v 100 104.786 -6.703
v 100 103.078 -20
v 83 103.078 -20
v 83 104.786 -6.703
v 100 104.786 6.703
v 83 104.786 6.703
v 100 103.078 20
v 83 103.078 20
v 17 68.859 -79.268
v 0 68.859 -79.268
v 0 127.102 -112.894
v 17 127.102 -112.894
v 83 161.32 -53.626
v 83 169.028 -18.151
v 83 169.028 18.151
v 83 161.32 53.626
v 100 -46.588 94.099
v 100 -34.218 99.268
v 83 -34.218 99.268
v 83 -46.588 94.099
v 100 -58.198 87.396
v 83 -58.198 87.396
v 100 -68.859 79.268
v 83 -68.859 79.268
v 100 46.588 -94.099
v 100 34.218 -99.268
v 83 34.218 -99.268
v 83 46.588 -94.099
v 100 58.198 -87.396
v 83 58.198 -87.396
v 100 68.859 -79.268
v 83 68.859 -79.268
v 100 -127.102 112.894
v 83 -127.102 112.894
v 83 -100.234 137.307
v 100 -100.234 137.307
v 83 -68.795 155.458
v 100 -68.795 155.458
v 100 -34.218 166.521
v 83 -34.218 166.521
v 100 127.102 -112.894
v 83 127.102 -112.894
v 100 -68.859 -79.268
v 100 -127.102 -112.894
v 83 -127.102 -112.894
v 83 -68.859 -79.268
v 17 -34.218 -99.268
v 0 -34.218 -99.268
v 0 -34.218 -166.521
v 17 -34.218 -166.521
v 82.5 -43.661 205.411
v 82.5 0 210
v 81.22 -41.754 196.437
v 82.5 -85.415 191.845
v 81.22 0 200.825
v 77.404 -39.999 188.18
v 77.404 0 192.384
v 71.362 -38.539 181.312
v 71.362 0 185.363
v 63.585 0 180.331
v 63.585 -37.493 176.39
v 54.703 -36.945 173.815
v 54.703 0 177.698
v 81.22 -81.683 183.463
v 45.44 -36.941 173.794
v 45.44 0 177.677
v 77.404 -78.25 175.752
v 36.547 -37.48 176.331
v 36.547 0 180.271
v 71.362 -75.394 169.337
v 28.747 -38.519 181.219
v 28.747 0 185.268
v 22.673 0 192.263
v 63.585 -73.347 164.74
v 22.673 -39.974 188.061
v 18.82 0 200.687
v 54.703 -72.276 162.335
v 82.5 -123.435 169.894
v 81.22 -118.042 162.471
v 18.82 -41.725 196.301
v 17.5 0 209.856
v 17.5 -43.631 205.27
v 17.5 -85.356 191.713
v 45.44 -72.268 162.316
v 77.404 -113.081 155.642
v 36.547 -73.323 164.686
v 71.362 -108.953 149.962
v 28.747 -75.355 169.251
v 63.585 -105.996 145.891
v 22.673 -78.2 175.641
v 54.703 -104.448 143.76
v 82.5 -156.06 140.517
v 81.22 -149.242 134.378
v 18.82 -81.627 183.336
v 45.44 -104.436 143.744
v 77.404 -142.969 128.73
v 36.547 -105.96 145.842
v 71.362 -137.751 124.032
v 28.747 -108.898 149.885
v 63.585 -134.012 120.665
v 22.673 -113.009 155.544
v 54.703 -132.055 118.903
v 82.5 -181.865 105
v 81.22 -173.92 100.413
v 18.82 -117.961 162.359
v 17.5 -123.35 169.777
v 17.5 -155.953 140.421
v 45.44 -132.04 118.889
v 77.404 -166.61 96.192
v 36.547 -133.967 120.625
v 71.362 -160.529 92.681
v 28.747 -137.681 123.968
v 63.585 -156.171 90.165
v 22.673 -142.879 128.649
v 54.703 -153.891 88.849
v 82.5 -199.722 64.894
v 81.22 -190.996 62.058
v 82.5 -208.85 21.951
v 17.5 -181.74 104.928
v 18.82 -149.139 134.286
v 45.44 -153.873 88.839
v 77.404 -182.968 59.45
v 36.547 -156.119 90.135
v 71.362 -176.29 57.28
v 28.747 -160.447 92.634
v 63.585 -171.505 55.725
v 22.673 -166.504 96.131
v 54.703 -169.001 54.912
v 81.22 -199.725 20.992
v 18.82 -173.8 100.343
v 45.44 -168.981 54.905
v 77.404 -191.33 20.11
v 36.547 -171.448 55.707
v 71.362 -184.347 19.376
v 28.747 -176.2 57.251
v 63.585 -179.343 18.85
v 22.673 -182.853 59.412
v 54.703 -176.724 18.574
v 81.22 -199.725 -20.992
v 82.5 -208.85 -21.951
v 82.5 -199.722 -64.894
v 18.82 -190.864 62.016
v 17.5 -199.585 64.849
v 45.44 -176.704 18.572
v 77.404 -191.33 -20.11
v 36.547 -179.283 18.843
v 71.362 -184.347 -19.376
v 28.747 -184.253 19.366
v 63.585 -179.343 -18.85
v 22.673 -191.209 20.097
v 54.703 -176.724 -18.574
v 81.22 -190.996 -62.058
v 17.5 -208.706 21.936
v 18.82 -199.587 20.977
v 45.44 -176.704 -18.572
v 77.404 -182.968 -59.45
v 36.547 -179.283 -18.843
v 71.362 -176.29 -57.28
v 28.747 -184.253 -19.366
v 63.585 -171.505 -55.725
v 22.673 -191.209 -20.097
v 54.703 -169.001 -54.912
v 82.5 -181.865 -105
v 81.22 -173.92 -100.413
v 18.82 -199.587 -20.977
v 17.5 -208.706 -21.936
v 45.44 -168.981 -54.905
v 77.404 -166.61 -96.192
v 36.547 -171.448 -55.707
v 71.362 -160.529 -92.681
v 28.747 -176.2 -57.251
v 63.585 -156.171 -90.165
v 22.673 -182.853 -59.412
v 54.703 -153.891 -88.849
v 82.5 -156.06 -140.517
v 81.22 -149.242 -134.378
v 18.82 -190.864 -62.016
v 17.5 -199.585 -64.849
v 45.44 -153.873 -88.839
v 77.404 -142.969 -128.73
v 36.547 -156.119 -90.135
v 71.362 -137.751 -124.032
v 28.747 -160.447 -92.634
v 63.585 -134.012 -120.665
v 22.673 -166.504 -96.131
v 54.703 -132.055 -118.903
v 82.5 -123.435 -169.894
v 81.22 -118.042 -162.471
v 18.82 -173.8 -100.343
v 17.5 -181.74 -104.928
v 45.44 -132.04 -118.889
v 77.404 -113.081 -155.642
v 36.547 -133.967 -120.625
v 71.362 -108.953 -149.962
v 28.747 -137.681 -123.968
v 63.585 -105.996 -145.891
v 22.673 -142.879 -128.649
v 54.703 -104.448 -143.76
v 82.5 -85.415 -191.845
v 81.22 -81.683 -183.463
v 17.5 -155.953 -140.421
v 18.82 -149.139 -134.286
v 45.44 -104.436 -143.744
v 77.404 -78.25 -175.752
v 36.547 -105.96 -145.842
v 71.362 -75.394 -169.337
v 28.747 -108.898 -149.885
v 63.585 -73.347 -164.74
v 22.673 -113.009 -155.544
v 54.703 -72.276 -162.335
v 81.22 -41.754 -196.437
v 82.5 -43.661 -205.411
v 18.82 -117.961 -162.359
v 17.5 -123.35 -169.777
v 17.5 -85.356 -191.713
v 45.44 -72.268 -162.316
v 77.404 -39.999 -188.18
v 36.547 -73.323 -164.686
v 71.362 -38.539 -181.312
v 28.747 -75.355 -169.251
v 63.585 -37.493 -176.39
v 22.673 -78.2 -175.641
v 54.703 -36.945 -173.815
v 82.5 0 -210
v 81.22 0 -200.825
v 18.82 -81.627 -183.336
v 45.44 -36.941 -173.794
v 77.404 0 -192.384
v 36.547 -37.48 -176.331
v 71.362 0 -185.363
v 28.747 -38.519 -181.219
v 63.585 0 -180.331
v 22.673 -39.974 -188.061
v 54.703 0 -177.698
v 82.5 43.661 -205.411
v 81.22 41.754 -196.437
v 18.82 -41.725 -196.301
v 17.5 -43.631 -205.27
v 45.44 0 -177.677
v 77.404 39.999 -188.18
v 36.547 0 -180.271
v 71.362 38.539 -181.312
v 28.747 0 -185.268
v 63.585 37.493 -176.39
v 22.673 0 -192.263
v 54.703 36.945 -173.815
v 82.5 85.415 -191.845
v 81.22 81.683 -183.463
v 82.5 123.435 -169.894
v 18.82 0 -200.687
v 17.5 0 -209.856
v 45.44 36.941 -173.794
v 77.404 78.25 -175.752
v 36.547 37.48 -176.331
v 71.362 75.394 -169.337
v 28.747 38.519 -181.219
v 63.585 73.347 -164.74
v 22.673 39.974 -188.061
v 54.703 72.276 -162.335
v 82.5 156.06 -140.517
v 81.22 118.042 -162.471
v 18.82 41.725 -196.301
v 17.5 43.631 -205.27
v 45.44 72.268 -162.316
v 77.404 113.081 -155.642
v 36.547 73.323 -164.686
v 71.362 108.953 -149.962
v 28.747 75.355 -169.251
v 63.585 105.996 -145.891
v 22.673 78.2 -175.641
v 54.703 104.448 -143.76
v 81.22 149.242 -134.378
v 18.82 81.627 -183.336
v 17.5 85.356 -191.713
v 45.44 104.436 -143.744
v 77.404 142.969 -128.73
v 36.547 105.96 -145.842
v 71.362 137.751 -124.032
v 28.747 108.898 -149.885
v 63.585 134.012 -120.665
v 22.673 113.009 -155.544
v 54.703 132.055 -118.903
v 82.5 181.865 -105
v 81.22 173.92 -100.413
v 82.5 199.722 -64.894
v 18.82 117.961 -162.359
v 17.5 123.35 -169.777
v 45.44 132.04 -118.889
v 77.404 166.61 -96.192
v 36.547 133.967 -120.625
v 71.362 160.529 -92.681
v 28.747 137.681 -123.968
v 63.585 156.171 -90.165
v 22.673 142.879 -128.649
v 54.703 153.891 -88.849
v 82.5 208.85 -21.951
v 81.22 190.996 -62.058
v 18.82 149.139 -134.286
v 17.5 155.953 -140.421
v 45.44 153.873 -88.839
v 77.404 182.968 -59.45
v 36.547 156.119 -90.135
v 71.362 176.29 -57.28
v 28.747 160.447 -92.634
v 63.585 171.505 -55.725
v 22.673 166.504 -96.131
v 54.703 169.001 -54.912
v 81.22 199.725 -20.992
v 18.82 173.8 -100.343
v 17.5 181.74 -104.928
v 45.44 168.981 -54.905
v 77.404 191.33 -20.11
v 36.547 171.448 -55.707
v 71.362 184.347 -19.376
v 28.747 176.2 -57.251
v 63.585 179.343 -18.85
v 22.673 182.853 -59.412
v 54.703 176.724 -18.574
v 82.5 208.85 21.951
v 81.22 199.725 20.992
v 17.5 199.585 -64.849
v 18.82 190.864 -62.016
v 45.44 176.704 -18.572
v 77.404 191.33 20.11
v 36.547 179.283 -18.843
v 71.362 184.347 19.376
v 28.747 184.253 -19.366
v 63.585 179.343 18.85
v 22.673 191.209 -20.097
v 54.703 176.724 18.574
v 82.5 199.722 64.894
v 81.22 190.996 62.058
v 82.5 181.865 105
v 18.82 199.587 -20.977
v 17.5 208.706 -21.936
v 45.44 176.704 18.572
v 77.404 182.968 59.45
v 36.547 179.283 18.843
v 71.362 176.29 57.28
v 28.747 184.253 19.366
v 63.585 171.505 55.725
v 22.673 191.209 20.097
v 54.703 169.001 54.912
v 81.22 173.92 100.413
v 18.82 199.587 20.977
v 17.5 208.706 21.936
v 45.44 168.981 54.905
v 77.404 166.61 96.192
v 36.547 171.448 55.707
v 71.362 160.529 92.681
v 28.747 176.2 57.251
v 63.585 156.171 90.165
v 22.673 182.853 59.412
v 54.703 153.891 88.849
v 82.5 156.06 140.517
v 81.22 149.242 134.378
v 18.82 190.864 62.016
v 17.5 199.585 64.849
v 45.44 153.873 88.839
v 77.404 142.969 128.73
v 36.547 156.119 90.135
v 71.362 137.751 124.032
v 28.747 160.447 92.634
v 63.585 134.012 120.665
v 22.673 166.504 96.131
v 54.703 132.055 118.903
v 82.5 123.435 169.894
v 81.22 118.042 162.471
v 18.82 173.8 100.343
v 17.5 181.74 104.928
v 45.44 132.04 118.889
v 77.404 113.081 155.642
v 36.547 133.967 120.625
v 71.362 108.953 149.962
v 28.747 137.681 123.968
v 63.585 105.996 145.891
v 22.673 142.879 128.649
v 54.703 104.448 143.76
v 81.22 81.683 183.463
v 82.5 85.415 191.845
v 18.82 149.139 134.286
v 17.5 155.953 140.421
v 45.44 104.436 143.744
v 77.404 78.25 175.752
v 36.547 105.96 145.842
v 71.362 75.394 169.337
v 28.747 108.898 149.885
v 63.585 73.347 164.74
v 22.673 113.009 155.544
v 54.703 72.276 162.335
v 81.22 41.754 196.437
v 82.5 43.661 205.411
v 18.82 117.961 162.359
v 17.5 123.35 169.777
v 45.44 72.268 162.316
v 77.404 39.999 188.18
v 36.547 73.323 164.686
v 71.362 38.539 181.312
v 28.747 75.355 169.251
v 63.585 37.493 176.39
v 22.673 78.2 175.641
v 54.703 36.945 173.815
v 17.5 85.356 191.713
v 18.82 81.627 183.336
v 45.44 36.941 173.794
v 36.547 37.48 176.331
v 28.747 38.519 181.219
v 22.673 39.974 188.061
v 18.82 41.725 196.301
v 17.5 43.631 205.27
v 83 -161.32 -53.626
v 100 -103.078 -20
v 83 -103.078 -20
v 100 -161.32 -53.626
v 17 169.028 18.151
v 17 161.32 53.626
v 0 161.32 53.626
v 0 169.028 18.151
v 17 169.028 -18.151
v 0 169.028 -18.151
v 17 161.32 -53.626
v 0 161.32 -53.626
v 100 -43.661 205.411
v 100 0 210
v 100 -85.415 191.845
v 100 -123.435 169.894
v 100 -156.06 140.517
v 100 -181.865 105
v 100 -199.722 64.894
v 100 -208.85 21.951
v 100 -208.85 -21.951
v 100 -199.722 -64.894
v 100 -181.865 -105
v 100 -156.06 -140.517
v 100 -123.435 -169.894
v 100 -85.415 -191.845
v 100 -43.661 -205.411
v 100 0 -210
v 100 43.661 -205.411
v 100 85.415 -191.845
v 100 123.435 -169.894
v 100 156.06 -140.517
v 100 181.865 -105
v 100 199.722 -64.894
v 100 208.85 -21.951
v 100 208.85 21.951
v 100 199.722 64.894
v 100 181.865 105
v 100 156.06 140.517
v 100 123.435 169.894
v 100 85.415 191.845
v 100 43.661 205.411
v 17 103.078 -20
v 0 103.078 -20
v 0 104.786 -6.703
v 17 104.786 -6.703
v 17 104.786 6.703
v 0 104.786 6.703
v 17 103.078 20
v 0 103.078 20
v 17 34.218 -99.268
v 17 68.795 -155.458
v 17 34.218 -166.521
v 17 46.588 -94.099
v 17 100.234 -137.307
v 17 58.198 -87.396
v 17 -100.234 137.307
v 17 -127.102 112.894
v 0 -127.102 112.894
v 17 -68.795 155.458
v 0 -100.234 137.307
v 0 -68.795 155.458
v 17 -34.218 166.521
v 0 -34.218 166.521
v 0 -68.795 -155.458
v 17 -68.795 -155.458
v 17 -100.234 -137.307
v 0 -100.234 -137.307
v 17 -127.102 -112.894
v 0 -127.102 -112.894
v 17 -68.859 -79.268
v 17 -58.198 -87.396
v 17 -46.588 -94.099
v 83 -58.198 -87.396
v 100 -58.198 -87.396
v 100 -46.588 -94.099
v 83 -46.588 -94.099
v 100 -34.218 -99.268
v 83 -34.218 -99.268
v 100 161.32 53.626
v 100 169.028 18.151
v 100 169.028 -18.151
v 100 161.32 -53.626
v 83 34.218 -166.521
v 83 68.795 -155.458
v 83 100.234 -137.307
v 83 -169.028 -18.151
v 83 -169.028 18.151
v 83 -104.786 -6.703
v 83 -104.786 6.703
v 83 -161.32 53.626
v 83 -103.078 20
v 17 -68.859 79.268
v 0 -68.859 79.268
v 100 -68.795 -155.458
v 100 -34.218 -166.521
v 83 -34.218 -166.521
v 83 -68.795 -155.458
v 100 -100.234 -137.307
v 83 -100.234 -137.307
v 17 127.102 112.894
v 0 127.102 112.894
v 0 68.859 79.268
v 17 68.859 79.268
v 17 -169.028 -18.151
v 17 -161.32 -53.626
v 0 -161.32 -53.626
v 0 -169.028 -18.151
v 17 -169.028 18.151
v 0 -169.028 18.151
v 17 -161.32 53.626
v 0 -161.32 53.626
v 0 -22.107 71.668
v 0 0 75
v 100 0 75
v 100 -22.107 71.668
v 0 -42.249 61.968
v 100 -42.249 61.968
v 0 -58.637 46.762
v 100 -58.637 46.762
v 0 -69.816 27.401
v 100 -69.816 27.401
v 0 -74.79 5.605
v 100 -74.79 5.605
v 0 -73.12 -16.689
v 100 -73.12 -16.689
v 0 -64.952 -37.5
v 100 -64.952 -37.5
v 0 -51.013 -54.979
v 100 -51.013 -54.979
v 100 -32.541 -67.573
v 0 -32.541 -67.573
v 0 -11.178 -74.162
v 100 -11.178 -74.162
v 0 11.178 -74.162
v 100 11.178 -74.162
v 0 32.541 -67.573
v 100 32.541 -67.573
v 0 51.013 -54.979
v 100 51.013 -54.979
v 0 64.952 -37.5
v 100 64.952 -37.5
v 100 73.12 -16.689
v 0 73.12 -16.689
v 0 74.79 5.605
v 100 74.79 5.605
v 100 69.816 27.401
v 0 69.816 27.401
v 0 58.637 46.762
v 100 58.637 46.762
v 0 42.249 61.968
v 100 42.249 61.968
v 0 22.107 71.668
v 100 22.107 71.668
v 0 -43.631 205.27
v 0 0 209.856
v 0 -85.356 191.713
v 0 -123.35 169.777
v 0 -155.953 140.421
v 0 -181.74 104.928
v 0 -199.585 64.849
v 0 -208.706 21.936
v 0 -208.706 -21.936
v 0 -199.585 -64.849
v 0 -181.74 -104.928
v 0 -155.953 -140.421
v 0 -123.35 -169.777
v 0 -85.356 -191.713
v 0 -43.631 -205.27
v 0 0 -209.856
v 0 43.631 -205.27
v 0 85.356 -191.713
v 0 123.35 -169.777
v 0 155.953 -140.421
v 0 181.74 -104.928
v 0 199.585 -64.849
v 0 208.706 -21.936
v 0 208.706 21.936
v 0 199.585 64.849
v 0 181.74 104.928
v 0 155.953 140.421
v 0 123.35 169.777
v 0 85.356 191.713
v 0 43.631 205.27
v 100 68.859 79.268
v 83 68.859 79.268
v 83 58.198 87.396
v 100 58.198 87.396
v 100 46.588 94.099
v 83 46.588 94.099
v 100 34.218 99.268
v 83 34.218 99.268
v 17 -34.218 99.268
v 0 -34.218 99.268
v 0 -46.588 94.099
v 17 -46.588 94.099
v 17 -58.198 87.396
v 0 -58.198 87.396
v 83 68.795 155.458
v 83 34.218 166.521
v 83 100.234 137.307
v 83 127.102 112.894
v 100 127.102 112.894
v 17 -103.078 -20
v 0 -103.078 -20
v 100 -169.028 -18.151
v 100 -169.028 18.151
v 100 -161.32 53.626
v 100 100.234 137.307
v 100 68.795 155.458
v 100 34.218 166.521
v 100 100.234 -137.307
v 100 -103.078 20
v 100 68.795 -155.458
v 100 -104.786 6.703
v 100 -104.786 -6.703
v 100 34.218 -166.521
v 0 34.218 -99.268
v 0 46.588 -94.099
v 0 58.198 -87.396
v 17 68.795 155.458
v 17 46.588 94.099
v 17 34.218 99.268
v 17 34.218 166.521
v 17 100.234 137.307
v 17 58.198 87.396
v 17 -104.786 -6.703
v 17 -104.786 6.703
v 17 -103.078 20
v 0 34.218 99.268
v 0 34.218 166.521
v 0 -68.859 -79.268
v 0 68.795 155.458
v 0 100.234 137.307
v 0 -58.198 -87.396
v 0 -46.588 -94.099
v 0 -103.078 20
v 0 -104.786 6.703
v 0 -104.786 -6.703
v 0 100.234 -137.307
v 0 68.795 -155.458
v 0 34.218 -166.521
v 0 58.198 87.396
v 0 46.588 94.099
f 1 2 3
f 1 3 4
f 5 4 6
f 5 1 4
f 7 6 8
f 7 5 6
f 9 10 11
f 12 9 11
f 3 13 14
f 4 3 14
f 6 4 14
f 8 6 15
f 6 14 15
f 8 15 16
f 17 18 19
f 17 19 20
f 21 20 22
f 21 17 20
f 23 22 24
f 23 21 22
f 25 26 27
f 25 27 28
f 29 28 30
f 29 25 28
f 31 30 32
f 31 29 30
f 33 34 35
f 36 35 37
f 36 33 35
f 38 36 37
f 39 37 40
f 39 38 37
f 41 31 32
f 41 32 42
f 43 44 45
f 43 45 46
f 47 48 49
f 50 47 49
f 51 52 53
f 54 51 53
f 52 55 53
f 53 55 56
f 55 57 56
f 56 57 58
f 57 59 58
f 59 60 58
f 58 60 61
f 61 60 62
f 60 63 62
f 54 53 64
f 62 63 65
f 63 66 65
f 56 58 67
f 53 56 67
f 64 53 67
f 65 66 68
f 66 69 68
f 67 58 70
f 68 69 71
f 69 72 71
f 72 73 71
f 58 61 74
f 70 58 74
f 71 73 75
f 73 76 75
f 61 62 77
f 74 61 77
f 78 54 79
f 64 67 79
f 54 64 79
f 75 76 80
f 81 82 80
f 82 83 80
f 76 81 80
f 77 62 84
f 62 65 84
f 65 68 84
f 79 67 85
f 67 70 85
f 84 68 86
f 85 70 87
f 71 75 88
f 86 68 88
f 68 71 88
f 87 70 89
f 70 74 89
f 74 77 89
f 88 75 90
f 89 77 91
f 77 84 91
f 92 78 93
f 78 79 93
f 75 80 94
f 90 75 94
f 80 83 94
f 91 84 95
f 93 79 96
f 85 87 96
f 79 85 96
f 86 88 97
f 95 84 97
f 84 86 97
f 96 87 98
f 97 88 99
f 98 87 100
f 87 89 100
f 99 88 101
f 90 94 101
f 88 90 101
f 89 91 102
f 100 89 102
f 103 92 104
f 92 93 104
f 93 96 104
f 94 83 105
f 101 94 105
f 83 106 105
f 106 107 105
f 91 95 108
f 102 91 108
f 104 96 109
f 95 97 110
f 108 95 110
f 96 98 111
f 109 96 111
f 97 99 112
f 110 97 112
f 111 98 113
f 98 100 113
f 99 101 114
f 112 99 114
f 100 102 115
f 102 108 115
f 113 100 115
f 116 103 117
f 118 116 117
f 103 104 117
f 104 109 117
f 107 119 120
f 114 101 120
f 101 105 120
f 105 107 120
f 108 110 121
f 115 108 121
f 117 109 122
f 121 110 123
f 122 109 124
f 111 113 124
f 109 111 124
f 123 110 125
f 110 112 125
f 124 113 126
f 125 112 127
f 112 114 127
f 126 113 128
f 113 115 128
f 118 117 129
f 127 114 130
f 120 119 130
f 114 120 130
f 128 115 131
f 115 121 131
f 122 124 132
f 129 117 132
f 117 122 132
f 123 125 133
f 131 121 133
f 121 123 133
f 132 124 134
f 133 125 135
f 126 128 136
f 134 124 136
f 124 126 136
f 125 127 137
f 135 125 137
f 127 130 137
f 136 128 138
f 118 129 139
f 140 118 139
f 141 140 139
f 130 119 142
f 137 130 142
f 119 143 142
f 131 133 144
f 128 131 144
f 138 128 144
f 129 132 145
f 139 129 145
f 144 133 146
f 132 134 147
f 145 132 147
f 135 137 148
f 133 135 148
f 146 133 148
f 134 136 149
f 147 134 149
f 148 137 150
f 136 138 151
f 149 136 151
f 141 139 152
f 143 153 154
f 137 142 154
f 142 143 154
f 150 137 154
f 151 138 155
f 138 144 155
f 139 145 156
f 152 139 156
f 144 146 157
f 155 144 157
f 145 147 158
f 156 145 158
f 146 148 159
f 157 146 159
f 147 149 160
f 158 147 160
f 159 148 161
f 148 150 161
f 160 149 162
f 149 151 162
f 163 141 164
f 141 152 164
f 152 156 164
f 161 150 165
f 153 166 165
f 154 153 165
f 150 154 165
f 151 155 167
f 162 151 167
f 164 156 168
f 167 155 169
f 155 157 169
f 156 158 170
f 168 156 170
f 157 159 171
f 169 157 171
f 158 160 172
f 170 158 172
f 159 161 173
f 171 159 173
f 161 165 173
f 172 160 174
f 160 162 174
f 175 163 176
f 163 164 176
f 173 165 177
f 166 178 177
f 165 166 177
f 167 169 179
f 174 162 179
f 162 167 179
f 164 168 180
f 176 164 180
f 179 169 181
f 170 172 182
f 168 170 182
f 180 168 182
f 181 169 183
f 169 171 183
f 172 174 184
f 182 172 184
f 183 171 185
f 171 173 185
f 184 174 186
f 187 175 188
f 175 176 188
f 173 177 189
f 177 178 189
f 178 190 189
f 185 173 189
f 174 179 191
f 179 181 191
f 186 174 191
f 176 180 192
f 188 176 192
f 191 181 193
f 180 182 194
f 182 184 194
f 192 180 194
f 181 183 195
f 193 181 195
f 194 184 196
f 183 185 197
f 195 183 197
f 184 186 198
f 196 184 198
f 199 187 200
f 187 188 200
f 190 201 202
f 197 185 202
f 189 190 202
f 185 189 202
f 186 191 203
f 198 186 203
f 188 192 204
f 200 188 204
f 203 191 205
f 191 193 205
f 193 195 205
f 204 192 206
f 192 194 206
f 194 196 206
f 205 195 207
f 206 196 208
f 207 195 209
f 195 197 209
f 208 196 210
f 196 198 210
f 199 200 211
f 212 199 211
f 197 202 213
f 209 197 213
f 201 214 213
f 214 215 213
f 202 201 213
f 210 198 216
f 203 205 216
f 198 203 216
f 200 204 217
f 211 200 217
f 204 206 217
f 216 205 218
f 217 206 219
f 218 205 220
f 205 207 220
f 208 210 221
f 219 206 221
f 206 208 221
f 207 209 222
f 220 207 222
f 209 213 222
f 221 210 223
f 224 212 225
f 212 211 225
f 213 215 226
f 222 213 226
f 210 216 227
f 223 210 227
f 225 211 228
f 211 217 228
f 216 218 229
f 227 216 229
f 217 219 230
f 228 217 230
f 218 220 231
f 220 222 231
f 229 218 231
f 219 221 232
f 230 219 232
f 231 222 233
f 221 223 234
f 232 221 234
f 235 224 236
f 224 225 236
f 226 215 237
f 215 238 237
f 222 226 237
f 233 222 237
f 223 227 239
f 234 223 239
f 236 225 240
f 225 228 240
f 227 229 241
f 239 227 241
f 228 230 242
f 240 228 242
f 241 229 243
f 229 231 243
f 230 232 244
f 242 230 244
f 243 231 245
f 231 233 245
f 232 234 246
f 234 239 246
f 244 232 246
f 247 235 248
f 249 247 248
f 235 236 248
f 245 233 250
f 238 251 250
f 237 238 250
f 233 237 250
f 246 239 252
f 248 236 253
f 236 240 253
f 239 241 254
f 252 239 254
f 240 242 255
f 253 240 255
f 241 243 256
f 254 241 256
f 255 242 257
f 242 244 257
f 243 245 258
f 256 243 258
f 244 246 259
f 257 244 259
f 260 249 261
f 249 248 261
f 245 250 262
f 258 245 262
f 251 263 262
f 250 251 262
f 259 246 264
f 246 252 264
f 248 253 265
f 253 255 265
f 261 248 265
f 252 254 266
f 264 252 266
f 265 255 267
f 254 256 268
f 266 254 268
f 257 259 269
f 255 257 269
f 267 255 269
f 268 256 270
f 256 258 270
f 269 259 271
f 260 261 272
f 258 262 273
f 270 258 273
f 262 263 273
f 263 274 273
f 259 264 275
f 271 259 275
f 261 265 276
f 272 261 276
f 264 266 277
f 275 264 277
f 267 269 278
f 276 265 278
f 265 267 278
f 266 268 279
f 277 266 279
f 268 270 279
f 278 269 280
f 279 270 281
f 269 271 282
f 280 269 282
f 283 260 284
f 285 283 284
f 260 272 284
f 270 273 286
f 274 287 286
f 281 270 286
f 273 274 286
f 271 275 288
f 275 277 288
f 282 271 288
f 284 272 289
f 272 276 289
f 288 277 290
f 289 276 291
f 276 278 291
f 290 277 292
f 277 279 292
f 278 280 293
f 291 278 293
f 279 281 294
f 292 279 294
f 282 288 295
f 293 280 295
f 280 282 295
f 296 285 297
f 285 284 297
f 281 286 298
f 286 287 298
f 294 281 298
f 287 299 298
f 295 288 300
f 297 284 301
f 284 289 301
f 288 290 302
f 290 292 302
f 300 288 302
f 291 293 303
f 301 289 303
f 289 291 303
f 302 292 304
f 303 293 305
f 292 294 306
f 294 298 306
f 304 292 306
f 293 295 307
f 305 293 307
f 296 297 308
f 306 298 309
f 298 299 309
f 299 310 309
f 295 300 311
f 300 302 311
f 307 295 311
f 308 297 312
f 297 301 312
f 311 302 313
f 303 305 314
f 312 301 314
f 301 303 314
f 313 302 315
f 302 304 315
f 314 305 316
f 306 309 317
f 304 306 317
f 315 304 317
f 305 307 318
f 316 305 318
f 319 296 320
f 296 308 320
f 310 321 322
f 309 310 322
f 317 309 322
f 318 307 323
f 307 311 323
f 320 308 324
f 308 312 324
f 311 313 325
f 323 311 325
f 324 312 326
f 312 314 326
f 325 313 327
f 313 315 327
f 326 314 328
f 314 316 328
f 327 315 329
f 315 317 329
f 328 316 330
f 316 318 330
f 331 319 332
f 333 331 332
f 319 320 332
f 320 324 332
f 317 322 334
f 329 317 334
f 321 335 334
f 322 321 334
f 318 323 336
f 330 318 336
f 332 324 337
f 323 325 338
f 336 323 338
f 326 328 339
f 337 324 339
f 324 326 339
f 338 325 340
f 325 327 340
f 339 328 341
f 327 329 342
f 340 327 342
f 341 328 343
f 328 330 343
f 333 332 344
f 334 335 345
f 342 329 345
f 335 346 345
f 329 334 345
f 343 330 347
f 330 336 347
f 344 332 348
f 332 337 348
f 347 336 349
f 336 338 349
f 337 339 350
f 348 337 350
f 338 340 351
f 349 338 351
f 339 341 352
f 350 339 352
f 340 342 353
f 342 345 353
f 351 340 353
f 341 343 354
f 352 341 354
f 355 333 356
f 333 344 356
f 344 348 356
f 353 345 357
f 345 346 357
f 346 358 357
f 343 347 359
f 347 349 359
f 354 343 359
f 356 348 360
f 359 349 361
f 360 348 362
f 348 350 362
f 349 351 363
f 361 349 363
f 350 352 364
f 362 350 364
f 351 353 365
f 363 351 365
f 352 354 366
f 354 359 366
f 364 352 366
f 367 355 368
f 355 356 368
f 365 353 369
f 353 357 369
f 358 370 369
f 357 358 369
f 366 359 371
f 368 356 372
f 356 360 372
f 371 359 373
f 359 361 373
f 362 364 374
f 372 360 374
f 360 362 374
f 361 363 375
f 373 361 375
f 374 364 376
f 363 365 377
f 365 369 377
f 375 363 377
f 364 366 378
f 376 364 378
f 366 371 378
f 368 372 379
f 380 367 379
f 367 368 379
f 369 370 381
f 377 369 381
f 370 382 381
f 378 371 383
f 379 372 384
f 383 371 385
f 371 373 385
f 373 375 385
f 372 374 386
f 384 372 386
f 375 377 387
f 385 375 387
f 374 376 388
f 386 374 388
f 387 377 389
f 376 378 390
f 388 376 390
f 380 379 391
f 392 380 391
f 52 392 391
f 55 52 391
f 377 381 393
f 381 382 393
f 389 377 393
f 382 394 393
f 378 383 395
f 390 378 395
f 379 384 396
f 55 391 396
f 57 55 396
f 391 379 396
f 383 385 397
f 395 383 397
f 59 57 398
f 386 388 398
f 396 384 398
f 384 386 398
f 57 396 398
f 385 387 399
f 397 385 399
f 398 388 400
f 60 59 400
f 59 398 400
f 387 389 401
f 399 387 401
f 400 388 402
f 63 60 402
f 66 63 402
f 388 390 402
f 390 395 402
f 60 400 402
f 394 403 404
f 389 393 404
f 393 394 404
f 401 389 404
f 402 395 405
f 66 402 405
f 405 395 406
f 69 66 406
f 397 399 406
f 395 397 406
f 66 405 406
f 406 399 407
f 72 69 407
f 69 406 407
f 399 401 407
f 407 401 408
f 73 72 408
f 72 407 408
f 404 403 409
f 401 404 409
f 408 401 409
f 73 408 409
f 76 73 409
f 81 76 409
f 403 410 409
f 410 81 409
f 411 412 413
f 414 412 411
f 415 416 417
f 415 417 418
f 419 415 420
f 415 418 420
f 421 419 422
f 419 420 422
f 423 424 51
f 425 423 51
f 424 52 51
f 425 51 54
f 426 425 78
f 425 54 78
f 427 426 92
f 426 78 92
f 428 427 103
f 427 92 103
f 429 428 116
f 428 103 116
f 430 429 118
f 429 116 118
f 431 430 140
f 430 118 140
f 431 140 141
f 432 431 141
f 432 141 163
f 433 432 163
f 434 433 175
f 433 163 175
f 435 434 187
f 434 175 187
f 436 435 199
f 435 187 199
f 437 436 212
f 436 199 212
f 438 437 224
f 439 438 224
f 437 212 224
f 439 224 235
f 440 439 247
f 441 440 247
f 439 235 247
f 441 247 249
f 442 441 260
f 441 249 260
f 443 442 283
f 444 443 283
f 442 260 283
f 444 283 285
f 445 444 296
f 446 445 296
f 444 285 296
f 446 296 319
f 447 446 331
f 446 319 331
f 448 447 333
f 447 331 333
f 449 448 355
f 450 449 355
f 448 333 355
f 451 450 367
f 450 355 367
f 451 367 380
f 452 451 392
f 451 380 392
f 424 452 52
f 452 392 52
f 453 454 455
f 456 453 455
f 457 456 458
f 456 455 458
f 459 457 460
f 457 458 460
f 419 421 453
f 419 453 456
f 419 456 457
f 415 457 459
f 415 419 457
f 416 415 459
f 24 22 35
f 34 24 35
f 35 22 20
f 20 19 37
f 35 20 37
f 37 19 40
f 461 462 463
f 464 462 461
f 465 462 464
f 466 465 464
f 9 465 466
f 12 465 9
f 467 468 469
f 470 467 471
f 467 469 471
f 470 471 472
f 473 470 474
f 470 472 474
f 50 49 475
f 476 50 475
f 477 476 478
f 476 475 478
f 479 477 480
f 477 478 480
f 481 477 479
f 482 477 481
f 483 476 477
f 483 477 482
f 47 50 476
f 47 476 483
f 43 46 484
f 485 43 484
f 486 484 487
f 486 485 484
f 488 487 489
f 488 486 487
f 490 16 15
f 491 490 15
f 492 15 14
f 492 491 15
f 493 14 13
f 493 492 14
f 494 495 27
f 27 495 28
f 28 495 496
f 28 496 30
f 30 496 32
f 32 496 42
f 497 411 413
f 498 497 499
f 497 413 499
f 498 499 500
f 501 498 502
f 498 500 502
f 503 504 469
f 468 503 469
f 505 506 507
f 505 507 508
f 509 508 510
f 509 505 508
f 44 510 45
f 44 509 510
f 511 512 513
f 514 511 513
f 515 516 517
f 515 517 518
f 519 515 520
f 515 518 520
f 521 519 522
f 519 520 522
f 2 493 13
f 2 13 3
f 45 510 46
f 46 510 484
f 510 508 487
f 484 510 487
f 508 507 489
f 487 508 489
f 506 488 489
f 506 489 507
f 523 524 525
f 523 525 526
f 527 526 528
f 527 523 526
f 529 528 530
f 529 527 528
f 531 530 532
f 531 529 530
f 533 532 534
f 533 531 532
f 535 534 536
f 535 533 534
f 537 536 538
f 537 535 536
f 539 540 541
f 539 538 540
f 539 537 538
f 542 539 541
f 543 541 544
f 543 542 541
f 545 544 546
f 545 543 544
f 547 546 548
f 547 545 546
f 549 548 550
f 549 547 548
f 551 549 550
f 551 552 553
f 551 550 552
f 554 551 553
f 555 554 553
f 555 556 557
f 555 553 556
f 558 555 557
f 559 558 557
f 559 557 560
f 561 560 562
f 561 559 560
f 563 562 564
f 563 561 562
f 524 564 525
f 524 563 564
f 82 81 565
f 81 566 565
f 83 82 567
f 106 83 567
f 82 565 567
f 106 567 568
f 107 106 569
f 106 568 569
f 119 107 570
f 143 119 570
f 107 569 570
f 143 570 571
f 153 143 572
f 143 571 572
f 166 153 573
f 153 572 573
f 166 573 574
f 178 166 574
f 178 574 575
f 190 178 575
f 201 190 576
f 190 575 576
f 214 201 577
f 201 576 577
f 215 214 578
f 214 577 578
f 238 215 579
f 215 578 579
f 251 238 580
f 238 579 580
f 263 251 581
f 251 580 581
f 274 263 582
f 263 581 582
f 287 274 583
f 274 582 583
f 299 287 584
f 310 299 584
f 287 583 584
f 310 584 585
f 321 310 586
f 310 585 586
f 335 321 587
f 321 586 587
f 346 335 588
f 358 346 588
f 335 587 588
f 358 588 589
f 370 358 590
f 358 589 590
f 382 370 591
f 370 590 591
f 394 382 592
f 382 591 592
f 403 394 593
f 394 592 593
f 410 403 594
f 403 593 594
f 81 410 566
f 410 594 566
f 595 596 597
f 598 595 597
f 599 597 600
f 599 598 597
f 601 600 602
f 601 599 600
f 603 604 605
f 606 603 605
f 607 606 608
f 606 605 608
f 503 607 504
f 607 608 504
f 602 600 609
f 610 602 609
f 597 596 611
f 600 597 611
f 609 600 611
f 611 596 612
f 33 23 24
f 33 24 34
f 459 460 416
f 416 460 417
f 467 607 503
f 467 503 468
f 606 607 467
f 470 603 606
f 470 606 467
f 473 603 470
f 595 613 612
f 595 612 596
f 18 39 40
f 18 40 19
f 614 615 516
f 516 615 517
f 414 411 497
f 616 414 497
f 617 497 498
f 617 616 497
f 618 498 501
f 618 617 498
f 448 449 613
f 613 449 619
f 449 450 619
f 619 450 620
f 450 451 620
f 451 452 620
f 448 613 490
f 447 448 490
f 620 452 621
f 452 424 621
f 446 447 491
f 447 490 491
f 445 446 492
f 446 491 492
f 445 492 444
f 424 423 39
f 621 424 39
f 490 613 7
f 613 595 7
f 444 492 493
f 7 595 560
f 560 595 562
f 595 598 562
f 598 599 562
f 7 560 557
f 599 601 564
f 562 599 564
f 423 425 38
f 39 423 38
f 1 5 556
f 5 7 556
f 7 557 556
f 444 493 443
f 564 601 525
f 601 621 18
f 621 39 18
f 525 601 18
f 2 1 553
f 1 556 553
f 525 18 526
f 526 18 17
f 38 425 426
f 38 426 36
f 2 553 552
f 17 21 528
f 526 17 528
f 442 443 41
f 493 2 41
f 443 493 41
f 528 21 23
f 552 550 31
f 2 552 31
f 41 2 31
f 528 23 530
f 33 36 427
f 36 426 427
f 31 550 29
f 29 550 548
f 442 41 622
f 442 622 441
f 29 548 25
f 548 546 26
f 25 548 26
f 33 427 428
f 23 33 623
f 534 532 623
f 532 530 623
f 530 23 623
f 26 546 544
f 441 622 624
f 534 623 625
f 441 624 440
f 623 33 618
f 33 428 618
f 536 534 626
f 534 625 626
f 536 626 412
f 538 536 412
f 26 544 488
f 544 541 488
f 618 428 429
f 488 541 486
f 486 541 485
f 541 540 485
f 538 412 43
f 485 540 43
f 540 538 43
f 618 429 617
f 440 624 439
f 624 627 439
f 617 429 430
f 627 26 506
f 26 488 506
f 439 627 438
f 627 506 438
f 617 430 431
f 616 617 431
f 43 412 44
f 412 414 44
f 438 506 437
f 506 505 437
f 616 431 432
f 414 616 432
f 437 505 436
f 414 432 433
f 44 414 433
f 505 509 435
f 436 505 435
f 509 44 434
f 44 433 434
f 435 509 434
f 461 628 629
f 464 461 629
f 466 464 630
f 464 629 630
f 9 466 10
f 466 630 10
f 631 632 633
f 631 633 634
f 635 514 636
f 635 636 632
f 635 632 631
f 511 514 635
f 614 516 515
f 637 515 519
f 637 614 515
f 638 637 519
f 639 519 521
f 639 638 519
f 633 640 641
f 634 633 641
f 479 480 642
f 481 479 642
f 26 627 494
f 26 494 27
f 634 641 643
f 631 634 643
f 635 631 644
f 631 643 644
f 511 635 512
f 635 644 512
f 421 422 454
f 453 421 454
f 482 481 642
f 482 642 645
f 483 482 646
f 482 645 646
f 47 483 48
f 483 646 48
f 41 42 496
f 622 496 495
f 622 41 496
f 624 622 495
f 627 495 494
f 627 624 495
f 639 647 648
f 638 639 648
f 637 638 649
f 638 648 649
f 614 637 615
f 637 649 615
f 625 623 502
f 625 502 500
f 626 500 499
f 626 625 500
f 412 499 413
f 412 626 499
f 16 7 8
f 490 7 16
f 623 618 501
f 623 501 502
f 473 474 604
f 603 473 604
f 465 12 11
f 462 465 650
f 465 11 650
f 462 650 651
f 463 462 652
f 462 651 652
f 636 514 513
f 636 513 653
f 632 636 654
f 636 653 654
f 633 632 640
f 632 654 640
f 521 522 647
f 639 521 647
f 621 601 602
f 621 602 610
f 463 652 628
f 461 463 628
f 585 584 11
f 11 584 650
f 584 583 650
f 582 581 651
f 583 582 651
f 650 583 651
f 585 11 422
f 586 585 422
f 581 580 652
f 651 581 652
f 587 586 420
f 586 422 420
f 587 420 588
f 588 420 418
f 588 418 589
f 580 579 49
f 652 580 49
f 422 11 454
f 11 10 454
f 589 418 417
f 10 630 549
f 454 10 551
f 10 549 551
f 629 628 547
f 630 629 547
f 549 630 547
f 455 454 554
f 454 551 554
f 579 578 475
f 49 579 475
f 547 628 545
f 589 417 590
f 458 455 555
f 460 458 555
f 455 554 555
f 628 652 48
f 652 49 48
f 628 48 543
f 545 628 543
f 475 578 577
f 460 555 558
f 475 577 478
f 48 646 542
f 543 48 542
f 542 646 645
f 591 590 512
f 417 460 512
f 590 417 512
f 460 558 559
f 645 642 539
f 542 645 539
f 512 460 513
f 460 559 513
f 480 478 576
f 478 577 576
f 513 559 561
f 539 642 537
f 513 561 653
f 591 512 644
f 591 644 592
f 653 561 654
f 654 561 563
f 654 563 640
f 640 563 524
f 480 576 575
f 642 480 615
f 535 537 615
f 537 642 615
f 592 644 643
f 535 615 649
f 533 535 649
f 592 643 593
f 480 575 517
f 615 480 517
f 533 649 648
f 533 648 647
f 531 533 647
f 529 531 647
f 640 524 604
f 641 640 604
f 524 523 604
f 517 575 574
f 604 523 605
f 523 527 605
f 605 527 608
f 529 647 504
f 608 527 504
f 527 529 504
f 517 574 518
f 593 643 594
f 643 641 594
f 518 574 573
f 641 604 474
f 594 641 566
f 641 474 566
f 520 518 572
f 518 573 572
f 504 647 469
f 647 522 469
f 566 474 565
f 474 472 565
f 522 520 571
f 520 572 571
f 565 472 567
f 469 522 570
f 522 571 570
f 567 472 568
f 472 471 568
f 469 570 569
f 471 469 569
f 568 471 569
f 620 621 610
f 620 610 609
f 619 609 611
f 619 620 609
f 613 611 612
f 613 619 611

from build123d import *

# Parameters (mm, degrees)
CUT_EXTRUDE1_DEPTH      = 236
CUT_EXTRUDE1_DEPTH_BACK = 258
SKETCH2_R               = 75
CUT_EXTRUDE2_DEPTH      = 17


with BuildPart() as part:
    # Sketch1 → Revolve1 (revolve)
    with BuildSketch(Plane.XY, mode=Mode.PRIVATE) as revolve1_sk:
        with BuildLine():
            Line((0, 0), (100, 0))
            Line((100, 0), (100, 210))
            Line((100, 210), (82.499679128, 210))
            ThreePointArc((82.499679128, 210), (50.072209241, 177.355662093), (17.5, 209.855581875))
            Line((17.5, 209.855581875), (0, 209.855581875))
            Line((0, 209.855581875), (0, 0))
        make_face()
    revolve(revolve1_sk.sketch.rotate(Axis((0, 0, 0), (1, 0, 0)), 90), axis=Axis((0, 0, 0), (1, 0, 0)))

    # Sketch2 → Cut-Extrude1 (cut, two sides: drawn at the far end of the back side and taken through both)
    with BuildSketch(Plane(origin=(100, 0, 0), x_dir=(0, 0, -1), z_dir=(1, 0, 0)).offset(-CUT_EXTRUDE1_DEPTH_BACK)):
        with Locations(Location((0, 0, 0), (0, 0, 180))):
            Circle(SKETCH2_R)
    extrude(amount=CUT_EXTRUDE1_DEPTH + CUT_EXTRUDE1_DEPTH_BACK, mode=Mode.SUBTRACT)

    # Sketch3 → Cut-Extrude2 (cut)
    with BuildSketch(Plane.ZY):
        with BuildLine():
            Line((20, 103.07764064), (53.626367642, 161.32021787))
            ThreePointArc((53.626367642, 161.32021787), (0, 170), (-53.626367642, 161.32021787))
            Line((-53.626367642, 161.32021787), (-20, 103.07764064))
            ThreePointArc((-20, 103.07764064), (0, 105), (20, 103.07764064))
        make_face()
        with BuildLine():
            Line((112.894222998, 127.101905625), (79.267855357, 68.859328396))
            ThreePointArc((79.267855357, 68.859328396), (90.932667397, 52.5), (99.267855357, 34.218312245))
            Line((99.267855357, 34.218312245), (166.52059064, 34.218312245))
            ThreePointArc((166.52059064, 34.218312245), (147.224318643, 85), (112.894222998, 127.101905625))
        make_face()
        with BuildLine():
            Line((166.52059064, -34.218312245), (99.267855357, -34.218312245))
            ThreePointArc((99.267855357, -34.218312245), (90.932667397, -52.5), (79.267855357, -68.859328396))
            Line((79.267855357, -68.859328396), (112.894222998, -127.101905625))
            ThreePointArc((112.894222998, -127.101905625), (147.224318643, -85), (166.52059064, -34.218312245))
        make_face()
        with BuildLine():
            Line((53.626367642, -161.32021787), (20, -103.07764064))
            ThreePointArc((20, -103.07764064), (0, -105), (-20, -103.07764064))
            Line((-20, -103.07764064), (-53.626367642, -161.32021787))
            ThreePointArc((-53.626367642, -161.32021787), (0, -170), (53.626367642, -161.32021787))
        make_face()
        with BuildLine():
            Line((-112.894222998, -127.101905625), (-79.267855357, -68.859328396))
            ThreePointArc((-79.267855357, -68.859328396), (-90.932667397, -52.5), (-99.267855357, -34.218312245))
            Line((-99.267855357, -34.218312245), (-166.52059064, -34.218312245))
            ThreePointArc((-166.52059064, -34.218312245), (-147.224318643, -85), (-112.894222998, -127.101905625))
        make_face()
        with BuildLine():
            Line((-166.52059064, 34.218312245), (-99.267855357, 34.218312245))
            ThreePointArc((-99.267855357, 34.218312245), (-90.932667397, 52.5), (-79.267855357, 68.859328396))
            Line((-79.267855357, 68.859328396), (-112.894222998, 127.101905625))
            ThreePointArc((-112.894222998, 127.101905625), (-147.224318643, 85), (-166.52059064, 34.218312245))
        make_face()
    cut_extrude2 = extrude(amount=-CUT_EXTRUDE2_DEPTH, mode=Mode.SUBTRACT)

    # Mirror1: Cut-Extrude2 across plane
    add(cut_extrude2.mirror(Plane(origin=(50, 0, 0), x_dir=(0, 0, 1), z_dir=(1, 0, 0))), mode=Mode.SUBTRACT)


solid = part.part
